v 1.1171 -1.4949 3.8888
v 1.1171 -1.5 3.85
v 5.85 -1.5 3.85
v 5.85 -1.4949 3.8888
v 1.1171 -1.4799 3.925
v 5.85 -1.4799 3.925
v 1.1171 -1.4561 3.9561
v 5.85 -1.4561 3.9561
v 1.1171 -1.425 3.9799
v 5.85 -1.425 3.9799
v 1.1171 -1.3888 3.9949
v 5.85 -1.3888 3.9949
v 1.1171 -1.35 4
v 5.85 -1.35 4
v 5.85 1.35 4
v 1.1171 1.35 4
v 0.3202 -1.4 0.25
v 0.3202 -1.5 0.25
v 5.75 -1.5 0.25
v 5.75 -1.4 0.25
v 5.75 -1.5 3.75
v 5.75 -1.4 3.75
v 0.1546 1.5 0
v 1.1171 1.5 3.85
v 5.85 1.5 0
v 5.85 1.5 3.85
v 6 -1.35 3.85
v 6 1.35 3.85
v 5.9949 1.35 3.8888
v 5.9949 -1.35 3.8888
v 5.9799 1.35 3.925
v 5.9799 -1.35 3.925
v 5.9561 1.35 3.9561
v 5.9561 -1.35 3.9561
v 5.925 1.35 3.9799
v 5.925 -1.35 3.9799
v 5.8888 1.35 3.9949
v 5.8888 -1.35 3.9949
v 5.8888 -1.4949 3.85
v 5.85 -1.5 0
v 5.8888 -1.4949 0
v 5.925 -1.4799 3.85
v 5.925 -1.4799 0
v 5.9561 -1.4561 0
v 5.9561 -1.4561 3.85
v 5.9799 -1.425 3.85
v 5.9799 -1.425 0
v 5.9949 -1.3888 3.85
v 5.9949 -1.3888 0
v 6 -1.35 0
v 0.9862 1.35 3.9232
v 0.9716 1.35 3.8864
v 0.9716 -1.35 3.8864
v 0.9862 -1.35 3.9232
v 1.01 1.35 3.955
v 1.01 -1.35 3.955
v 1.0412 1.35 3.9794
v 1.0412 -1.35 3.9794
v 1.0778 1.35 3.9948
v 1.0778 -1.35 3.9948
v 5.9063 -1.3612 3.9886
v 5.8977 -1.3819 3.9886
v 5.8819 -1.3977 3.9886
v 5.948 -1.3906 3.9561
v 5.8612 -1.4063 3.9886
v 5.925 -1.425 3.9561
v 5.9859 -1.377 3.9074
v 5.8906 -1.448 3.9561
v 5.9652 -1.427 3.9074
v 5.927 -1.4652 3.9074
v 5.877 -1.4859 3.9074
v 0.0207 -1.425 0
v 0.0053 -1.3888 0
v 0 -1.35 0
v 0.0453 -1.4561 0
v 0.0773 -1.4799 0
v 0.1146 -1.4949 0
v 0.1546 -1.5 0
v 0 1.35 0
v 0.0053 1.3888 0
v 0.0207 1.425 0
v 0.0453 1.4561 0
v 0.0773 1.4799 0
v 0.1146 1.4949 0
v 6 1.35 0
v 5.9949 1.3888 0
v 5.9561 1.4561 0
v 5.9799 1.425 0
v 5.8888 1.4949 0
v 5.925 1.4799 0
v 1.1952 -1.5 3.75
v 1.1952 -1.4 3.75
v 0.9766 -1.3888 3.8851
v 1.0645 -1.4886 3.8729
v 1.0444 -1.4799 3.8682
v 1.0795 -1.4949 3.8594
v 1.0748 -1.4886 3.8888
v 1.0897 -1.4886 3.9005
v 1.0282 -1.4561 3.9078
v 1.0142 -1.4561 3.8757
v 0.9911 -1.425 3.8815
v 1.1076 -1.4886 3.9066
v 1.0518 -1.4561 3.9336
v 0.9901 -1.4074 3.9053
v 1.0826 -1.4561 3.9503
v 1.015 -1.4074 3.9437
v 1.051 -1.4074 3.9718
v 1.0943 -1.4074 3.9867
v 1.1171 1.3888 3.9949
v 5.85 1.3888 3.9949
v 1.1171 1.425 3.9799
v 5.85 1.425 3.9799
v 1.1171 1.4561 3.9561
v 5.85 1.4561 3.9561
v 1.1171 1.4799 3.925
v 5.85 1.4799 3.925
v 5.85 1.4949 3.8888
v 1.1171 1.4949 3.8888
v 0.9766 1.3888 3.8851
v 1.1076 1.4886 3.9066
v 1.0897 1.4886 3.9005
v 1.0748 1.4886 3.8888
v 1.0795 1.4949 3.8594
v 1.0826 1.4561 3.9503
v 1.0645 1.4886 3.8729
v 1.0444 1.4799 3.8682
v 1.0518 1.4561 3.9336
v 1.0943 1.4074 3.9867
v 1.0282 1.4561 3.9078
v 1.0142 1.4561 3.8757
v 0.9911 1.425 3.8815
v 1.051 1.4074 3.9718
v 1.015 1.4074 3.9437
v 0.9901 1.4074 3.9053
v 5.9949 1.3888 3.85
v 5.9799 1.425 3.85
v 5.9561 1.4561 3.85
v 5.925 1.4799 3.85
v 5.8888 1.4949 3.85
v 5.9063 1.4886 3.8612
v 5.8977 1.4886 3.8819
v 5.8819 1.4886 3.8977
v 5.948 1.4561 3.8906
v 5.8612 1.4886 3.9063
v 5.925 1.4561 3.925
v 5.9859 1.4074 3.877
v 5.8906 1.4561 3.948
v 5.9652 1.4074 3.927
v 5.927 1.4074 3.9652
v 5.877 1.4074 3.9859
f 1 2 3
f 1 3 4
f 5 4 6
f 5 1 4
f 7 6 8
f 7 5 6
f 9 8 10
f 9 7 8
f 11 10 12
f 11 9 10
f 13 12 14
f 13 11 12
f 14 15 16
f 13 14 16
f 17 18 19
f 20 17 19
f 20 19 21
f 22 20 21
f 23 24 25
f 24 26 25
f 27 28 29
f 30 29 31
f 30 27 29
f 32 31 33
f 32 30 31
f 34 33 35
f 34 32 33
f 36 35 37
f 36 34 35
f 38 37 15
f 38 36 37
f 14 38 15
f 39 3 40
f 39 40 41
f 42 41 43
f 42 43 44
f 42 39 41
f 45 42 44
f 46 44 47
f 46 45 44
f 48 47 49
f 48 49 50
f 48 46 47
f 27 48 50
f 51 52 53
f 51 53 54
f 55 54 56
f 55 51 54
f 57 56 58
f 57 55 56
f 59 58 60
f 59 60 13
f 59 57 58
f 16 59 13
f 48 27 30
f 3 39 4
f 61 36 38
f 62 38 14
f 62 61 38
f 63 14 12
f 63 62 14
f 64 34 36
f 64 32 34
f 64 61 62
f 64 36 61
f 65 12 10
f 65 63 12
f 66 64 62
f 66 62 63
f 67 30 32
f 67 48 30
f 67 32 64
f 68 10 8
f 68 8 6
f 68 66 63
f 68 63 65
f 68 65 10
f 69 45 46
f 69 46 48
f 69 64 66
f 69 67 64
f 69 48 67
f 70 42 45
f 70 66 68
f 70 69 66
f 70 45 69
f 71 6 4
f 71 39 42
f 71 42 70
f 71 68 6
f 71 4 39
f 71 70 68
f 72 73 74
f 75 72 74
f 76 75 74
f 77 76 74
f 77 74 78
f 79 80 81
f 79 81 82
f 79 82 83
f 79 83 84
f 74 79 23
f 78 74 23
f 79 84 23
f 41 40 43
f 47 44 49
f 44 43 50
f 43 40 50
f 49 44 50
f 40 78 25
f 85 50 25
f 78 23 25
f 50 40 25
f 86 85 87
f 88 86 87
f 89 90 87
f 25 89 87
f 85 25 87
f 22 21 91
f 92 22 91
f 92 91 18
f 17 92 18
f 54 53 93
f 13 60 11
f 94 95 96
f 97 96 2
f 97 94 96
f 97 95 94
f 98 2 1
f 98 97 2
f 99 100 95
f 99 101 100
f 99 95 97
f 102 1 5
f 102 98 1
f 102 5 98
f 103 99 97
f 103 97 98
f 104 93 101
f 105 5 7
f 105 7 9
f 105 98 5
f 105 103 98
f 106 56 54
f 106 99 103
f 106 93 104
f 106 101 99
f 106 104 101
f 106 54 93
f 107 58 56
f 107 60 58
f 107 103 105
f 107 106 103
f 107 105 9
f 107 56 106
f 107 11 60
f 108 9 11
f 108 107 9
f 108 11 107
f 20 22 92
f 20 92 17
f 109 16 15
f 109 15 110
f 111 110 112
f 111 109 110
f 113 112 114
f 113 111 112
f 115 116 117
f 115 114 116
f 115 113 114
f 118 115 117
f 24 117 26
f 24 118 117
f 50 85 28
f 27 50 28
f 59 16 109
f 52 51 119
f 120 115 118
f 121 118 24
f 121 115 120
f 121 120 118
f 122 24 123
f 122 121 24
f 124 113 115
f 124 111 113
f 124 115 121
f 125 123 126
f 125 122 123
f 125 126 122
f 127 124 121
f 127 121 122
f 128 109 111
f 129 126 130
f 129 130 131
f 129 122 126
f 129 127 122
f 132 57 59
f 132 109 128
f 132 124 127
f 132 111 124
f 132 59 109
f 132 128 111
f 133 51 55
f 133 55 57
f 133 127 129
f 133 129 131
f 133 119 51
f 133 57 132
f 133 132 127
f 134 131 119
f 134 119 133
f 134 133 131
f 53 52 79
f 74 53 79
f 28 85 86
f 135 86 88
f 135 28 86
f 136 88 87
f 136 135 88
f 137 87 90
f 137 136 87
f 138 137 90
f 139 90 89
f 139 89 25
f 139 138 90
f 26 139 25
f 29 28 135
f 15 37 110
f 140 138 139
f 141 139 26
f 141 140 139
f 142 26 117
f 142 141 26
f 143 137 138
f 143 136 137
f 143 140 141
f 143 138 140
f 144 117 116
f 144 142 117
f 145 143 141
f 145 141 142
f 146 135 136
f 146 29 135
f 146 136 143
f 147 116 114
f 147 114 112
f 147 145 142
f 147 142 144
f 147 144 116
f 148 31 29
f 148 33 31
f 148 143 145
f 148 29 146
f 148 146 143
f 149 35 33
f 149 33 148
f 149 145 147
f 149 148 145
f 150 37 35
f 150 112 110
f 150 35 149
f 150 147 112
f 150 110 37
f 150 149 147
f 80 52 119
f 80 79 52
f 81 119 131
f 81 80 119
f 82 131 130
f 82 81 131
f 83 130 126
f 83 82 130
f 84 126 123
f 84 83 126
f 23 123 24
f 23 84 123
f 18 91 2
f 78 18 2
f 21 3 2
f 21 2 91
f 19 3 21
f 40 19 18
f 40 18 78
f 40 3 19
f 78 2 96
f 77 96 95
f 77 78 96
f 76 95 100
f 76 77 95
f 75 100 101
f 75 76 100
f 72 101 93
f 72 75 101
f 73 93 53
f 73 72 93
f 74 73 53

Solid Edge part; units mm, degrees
sketch "Sketch1" plane through (0, 0, 0) normal (0, -1, 0) x (1, 0, 0)
  line L0 (0, 0) -> (6, 0)
  line L1 (6, 0) -> (6, 4)
  line L2 (6, 4) -> (1, 4)
  line L3 (1, 4) -> (0, 0)
extrude "Protrusion1" add sketch "Sketch1" along normal mid plane 3
sketch "Sketch2" plane through (3, -1.5, 2) normal (0, -1, 0) x (1, 0, 0)
  line L0 (-1.8048, 1.75) -> (-2.6798, -1.75)
  line L1 (-2.6798, -1.75) -> (2.75, -1.75)
  line L2 (2.75, -1.75) -> (2.75, 1.75)
  line L3 (2.75, 1.75) -> (-1.8048, 1.75)
  dimension "D1" = 0.25
extrude "ExtrudedCutout_1" cut sketch "Sketch2" against normal blind 0.1
fillet "Round_1" radius 0.15 8 edges at (6, -1.5, 2) (3.5, -1.5, 4) (6, 0, 4) (6, 1.5, 2) (3.5, 1.5, 4) (1, 0, 4) (0.5, 1.5, 2) (0.5, -1.5, 2)
properties material "Stainless Steel, 420"
